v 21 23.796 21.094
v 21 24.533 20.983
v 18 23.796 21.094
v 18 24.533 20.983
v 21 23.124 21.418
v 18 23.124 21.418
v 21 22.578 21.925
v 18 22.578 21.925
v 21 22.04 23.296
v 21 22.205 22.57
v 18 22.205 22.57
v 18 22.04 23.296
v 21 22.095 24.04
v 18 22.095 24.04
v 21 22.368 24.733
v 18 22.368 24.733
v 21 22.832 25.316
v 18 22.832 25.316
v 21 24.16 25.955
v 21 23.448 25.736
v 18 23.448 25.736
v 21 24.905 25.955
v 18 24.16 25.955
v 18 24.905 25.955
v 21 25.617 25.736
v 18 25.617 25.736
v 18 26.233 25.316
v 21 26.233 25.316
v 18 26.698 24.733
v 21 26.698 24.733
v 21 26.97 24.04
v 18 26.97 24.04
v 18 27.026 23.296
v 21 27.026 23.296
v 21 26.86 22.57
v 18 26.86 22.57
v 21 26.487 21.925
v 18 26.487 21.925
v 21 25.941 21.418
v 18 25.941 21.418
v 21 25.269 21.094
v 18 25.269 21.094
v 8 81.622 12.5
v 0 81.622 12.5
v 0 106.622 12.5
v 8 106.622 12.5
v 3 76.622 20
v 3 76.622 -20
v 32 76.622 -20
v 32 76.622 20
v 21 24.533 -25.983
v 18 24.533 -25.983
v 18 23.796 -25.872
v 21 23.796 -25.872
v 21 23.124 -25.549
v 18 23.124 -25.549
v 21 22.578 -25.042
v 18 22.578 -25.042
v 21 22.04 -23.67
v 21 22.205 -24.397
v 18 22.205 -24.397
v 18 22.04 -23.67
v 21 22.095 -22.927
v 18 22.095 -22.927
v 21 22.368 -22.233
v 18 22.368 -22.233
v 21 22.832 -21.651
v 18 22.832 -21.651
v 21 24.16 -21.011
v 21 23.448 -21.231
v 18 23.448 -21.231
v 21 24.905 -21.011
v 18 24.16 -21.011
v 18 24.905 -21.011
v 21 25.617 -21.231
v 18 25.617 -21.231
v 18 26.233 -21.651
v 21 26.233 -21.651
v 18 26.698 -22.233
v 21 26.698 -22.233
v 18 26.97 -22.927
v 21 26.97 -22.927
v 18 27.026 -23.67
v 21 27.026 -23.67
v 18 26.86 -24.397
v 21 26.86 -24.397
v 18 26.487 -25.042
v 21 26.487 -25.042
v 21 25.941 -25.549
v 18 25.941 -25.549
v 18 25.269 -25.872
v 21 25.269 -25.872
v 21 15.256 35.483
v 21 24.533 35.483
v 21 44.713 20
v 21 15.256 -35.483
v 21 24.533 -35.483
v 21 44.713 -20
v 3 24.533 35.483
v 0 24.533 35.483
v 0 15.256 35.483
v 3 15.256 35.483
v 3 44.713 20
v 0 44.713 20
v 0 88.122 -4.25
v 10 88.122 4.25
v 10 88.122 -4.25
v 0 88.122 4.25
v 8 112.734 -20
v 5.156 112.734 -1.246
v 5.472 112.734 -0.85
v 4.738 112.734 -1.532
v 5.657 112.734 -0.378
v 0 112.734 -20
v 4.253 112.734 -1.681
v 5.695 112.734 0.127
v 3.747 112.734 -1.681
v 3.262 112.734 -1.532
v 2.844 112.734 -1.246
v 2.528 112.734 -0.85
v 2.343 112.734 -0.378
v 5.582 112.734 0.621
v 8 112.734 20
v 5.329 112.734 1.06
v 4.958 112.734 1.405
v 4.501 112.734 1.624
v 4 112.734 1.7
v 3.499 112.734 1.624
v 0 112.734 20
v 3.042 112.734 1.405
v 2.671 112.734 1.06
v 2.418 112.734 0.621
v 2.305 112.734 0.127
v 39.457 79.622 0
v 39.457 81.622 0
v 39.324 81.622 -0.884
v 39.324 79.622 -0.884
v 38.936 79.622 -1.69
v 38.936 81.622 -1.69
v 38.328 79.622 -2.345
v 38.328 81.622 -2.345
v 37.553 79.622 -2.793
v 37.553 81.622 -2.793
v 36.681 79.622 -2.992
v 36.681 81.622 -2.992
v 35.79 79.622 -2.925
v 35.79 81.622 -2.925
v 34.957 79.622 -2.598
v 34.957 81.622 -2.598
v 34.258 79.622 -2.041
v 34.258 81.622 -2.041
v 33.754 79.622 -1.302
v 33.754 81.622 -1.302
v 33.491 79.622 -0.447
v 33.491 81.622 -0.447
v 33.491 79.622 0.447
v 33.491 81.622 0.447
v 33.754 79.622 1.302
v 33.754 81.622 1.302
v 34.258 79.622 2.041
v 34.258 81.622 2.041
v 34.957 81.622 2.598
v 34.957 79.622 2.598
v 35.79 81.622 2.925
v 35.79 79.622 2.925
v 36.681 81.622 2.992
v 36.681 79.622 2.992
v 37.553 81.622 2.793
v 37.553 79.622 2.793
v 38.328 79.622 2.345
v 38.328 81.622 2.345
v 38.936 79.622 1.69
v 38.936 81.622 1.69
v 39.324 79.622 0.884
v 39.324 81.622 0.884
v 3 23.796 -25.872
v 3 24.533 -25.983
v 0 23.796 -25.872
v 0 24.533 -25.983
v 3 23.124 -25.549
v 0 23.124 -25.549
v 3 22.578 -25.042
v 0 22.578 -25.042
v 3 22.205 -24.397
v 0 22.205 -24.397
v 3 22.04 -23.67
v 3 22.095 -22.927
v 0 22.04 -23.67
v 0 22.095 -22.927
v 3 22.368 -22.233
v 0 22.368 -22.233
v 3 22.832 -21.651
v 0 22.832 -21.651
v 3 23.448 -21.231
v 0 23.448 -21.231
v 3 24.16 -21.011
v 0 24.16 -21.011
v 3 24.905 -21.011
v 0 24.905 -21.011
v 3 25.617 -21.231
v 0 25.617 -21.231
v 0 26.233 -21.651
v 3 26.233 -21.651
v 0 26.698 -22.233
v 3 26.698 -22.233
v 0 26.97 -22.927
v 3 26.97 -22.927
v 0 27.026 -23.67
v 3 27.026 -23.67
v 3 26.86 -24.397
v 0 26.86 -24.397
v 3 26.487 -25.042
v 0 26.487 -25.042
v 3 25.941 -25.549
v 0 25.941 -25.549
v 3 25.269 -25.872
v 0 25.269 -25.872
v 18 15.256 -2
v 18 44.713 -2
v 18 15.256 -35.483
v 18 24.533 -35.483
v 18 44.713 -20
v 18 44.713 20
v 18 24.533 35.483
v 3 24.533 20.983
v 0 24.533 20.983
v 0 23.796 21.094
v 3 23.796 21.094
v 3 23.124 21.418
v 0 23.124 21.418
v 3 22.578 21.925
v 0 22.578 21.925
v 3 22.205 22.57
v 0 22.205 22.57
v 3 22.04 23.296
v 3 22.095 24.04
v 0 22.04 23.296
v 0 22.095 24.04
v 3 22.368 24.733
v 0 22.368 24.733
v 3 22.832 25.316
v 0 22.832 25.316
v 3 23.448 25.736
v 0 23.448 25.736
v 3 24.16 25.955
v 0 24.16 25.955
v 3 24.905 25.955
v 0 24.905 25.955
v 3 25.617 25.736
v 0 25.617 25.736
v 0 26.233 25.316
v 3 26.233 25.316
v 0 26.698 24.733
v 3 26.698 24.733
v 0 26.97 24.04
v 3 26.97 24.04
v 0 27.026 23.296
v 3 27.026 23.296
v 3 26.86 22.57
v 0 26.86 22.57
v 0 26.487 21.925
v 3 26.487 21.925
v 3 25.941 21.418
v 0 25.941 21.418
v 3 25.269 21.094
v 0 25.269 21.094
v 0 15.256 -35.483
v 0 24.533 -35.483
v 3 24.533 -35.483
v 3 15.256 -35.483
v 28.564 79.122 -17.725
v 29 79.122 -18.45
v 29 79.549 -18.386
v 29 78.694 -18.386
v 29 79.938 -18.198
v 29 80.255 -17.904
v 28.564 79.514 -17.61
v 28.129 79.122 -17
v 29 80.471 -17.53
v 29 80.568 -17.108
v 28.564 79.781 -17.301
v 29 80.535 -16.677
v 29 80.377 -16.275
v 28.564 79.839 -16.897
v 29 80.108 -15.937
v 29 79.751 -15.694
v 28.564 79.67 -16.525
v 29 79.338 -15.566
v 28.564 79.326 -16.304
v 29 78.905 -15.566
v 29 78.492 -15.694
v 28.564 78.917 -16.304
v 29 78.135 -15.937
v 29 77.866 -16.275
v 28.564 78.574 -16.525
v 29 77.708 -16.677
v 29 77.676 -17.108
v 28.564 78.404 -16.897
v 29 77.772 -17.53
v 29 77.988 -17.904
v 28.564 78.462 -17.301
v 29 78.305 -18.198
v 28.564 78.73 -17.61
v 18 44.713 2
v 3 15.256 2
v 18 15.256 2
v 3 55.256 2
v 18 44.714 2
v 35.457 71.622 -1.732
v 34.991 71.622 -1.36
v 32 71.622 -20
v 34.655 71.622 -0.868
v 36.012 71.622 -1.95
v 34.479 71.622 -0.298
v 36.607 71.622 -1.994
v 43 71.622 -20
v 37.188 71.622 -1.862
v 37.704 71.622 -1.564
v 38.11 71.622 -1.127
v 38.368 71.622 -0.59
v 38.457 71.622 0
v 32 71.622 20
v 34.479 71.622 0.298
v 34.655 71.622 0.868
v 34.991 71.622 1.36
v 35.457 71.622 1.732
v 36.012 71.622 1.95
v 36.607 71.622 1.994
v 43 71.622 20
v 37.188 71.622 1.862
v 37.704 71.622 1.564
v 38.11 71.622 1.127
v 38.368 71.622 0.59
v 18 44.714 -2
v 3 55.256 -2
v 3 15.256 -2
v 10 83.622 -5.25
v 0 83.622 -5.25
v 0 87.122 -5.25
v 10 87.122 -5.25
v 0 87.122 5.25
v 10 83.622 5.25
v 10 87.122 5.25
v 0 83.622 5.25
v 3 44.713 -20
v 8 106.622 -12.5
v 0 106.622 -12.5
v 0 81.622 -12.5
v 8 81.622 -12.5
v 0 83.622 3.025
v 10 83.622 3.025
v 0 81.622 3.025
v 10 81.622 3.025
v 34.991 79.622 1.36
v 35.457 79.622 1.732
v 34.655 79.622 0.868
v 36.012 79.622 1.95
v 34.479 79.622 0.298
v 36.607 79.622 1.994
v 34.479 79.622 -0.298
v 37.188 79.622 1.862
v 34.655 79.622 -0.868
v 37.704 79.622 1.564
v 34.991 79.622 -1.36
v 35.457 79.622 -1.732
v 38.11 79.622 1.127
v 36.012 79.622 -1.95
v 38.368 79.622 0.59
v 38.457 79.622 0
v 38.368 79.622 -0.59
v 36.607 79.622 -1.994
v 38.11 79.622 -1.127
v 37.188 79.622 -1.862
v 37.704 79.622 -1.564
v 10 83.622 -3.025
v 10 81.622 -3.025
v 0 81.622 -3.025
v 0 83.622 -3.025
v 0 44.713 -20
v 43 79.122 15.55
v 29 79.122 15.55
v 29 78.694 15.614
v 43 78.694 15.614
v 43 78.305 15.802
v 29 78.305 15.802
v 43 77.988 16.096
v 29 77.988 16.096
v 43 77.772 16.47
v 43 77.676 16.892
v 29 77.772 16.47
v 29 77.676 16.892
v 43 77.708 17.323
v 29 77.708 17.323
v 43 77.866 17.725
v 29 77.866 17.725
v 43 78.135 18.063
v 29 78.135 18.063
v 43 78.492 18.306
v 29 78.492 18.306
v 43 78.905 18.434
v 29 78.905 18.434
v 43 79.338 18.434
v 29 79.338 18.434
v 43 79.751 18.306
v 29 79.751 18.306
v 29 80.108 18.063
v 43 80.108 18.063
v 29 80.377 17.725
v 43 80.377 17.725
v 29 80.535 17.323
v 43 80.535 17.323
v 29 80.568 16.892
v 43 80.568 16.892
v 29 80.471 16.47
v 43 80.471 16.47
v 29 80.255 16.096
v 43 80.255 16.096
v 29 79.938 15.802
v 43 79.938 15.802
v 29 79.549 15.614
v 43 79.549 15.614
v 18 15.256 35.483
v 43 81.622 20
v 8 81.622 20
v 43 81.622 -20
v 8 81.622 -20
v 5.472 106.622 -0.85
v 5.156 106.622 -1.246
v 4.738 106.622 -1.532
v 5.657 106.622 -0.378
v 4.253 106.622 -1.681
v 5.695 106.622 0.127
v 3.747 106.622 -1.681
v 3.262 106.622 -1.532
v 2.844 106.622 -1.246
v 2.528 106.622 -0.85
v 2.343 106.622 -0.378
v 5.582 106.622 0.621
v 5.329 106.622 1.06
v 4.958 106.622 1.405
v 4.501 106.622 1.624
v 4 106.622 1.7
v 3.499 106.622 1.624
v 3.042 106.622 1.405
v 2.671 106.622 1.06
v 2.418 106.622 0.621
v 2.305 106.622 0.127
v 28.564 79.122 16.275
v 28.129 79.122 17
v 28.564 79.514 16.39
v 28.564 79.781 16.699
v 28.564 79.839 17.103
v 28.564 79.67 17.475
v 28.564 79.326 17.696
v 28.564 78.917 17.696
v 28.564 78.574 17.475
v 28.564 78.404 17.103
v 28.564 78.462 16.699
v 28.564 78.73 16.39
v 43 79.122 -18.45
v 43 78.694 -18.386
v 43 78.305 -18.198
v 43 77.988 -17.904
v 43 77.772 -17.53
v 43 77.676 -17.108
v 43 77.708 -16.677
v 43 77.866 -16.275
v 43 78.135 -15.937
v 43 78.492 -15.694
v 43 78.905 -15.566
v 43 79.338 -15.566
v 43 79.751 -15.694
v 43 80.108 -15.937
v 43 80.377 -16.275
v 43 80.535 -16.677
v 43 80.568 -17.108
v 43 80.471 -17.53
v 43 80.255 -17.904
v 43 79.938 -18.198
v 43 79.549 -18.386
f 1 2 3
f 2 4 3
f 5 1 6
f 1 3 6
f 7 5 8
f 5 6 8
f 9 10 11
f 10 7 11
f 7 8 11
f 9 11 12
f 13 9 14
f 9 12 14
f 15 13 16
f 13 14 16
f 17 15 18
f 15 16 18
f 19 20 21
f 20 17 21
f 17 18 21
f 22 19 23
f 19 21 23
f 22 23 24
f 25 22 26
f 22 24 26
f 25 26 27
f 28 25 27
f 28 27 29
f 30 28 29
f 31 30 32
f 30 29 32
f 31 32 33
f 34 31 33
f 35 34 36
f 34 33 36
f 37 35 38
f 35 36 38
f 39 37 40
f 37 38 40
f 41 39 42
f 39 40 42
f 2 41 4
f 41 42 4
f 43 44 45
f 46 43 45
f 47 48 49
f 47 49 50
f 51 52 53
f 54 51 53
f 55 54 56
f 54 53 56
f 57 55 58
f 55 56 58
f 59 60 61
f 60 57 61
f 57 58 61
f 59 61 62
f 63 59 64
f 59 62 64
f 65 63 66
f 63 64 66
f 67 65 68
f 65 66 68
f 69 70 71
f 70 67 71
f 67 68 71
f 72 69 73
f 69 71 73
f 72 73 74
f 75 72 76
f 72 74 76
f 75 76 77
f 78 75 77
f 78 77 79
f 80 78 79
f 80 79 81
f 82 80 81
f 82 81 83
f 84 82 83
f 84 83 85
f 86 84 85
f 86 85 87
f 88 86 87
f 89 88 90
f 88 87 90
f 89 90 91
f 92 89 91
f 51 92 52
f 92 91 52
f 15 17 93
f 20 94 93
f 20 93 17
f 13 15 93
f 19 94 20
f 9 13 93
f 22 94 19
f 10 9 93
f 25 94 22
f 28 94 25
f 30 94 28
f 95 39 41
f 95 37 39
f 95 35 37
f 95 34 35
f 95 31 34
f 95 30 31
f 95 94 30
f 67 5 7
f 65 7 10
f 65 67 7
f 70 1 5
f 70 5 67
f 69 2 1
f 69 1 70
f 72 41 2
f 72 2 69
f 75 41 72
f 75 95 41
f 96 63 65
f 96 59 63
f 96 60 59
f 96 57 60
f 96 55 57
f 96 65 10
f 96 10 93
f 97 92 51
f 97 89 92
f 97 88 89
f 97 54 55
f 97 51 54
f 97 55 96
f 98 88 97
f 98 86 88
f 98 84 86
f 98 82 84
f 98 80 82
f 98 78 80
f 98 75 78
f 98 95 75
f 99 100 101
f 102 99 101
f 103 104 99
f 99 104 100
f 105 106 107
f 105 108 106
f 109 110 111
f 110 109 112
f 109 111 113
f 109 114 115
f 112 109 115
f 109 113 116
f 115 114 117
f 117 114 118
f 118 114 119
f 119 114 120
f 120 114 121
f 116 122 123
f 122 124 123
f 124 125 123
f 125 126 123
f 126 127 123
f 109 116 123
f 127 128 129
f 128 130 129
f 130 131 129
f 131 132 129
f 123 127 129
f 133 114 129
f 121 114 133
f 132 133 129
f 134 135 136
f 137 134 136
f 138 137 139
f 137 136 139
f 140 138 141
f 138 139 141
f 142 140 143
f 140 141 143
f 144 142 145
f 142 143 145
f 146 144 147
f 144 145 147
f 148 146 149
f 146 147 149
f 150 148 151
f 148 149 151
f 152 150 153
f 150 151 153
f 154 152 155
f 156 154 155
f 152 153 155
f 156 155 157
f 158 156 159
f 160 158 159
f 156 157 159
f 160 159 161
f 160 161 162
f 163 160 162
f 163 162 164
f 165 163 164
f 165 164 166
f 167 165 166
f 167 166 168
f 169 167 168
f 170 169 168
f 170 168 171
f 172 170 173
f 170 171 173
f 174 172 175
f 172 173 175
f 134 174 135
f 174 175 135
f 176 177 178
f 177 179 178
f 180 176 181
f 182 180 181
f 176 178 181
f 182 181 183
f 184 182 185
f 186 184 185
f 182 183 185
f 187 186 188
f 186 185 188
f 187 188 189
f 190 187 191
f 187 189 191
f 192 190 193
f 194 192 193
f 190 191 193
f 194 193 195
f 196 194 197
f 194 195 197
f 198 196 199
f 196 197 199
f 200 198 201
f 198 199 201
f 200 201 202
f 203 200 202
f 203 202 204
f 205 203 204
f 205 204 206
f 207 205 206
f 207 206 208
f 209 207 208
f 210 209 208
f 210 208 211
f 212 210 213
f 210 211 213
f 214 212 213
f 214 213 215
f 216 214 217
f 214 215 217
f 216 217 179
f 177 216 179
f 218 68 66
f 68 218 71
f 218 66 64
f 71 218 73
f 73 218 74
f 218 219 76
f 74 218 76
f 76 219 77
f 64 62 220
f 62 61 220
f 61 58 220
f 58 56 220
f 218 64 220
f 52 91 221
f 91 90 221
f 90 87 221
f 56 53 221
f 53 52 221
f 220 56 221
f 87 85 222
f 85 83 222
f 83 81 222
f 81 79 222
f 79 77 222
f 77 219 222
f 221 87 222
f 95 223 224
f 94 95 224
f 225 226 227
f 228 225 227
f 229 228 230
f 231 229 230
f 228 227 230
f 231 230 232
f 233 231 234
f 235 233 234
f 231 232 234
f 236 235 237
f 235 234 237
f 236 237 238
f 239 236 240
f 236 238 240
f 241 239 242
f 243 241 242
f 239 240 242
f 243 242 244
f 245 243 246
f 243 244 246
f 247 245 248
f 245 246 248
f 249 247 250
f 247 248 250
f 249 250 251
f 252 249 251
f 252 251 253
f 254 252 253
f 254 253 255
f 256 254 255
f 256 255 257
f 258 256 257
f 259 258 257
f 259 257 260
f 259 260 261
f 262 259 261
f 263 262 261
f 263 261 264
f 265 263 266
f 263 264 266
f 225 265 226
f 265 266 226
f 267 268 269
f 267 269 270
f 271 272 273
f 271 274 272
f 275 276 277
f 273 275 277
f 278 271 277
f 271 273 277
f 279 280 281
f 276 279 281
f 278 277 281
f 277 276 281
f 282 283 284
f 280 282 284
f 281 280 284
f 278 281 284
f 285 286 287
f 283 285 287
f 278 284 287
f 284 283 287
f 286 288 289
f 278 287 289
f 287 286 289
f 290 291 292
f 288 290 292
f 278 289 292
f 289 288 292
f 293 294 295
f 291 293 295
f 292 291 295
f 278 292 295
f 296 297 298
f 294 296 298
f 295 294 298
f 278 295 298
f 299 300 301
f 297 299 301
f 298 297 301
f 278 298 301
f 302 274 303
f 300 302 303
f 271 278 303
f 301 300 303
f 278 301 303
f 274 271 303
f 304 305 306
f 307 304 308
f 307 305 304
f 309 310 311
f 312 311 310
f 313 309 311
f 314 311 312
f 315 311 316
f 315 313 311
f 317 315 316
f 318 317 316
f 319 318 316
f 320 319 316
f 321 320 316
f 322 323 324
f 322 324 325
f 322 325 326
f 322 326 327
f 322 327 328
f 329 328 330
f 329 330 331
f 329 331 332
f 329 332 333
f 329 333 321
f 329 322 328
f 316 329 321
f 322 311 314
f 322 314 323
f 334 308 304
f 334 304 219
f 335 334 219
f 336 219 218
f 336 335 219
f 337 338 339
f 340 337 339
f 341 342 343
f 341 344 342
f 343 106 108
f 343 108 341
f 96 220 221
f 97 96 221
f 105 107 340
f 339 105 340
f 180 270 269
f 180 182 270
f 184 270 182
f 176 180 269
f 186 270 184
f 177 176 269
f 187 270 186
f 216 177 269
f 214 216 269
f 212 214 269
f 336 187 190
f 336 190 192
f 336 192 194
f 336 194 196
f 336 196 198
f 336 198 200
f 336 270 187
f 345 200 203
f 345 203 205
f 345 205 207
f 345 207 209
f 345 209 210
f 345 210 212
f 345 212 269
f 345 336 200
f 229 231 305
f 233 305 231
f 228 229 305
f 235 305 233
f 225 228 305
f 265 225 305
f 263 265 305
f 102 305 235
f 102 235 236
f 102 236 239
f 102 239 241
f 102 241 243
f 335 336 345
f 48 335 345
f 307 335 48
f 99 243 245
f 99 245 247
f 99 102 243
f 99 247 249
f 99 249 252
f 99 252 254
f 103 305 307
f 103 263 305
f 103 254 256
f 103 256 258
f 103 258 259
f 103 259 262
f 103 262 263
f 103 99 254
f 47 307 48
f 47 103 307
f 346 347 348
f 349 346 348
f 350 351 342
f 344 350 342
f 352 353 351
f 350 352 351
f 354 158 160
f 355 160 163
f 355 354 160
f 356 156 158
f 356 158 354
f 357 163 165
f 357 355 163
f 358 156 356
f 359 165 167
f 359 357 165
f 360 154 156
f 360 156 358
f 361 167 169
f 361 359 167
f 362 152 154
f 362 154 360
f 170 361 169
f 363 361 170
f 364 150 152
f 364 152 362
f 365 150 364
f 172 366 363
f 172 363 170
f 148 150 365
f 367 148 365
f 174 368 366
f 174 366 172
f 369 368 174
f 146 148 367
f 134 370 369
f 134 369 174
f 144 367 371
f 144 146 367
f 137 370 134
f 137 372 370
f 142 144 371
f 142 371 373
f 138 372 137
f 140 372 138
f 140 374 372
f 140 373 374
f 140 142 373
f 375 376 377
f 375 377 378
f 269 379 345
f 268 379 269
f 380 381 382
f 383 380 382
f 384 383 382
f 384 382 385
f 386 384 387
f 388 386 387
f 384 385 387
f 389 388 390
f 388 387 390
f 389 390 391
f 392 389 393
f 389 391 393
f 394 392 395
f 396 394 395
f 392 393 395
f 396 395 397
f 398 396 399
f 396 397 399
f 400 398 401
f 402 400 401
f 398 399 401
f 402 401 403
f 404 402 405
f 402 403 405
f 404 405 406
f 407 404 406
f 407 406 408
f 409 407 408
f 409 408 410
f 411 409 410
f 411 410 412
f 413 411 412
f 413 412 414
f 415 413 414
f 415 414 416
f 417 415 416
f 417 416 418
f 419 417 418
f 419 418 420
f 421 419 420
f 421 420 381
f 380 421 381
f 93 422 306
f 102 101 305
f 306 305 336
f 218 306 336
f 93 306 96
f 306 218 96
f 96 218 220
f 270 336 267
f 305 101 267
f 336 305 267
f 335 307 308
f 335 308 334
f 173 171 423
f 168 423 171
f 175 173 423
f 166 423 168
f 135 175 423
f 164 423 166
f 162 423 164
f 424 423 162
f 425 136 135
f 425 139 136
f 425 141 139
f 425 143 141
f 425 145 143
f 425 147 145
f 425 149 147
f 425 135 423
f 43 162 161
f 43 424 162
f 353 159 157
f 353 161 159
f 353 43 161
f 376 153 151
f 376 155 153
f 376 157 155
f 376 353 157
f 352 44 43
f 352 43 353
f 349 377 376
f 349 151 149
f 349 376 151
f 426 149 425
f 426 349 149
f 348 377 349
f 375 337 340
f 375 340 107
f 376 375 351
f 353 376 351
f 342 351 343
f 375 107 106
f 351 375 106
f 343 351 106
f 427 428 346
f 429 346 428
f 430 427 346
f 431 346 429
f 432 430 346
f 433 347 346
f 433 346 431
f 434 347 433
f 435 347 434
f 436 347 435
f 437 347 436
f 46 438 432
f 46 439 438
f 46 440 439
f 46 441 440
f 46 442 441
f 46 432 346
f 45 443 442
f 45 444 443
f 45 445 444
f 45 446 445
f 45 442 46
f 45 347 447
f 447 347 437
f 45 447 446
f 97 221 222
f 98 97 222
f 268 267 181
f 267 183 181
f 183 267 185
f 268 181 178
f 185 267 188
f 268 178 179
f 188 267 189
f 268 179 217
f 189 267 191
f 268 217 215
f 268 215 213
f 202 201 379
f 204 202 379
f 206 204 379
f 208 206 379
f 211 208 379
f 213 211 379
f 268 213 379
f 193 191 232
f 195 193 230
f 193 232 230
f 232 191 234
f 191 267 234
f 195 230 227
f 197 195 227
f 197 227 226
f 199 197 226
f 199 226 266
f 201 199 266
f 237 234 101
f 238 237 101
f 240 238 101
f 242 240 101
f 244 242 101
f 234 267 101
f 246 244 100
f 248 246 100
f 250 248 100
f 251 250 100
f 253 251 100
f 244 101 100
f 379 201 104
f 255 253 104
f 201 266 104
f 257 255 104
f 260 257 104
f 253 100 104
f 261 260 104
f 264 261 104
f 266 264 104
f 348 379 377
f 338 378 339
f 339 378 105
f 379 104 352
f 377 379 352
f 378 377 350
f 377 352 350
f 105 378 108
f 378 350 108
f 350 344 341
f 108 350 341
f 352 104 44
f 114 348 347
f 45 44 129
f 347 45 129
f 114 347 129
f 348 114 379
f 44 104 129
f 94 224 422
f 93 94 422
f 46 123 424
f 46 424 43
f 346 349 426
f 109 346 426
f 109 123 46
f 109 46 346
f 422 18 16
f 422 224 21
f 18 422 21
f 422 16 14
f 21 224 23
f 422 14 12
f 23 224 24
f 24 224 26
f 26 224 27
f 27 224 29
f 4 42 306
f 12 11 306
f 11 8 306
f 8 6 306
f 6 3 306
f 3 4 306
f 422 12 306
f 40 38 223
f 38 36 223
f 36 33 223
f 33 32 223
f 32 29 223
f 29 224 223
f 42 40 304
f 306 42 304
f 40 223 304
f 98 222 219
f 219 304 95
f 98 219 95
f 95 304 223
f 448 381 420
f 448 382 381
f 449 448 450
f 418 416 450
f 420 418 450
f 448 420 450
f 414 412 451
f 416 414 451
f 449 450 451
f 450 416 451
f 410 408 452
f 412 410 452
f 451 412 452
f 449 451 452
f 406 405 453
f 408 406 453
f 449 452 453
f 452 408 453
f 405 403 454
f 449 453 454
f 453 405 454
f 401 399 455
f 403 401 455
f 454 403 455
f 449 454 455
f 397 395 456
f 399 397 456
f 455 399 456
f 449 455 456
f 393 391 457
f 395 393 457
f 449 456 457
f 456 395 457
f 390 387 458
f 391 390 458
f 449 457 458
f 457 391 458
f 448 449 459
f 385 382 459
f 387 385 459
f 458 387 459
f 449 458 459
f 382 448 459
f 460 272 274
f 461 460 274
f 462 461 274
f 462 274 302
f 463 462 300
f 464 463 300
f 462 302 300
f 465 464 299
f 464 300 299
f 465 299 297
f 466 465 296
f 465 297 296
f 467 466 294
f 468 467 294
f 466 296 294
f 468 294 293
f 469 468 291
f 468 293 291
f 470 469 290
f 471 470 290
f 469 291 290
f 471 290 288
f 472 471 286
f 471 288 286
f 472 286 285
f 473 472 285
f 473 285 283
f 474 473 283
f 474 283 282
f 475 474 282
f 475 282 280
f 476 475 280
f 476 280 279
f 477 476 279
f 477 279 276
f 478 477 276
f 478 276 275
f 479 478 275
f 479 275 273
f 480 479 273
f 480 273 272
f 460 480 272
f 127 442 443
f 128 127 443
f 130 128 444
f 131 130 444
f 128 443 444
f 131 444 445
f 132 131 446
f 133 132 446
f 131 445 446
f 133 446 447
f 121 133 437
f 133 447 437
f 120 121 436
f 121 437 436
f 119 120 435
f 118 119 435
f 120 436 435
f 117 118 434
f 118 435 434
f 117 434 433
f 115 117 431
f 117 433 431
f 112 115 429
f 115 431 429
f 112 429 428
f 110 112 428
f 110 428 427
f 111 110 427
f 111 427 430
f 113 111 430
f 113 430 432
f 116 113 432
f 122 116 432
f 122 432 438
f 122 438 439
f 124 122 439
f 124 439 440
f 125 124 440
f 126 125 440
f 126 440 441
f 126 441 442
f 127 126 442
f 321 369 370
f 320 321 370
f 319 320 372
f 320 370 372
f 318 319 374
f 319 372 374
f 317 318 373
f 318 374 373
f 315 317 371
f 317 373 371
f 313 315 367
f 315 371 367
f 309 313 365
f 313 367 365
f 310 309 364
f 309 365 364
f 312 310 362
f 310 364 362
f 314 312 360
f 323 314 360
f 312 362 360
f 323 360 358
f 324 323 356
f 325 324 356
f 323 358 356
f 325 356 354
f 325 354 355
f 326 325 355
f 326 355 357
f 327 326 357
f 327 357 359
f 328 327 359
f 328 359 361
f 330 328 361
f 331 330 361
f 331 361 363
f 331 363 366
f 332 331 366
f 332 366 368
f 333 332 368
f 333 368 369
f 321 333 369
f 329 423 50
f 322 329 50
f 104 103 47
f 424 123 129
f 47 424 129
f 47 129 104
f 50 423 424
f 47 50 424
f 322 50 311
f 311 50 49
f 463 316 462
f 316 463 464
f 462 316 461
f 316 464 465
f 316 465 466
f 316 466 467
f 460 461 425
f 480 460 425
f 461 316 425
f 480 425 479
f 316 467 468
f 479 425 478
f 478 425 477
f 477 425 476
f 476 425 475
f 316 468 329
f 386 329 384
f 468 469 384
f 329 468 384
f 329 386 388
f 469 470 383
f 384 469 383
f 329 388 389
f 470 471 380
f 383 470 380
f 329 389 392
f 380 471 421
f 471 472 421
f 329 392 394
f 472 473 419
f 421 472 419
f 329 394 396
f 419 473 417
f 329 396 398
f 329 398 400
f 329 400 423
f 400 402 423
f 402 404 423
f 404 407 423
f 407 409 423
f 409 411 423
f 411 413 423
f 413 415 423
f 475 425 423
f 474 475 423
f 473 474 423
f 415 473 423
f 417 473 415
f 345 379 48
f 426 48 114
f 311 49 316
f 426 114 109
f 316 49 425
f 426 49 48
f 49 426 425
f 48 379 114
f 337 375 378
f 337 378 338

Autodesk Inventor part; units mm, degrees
ref_plane "YZ Plane" through (0, 0, 0) normal (1, 0, 0) x (0, 1, 0)
ref_plane "XZ Plane" through (0, 0, 0) normal (0, 1, 0) x (-1, 0, 0)
ref_plane "XY Plane" through (0, 0, 0) normal (0, 0, 1) x (1, 0, 0)
sketch "Szkic1" plane through (0, 0, 0) normal (1, 0, 0) x (0, 1, 0)
  line L0 (81.6216, 12.5) -> (106.6216, 12.5)
  line L1 (106.6216, 12.5) -> (106.6216, -12.5)
  line L2 (106.6216, -12.5) -> (81.6216, -12.5)
  line L3 (81.6216, -12.5) -> (81.6216, 12.5)
  line L4 (81.6216, 12.5) -> (106.6216, -12.5) construction
  line L5 (106.6216, 12.5) -> (81.6216, -12.5) construction
  line L6 (112.7335, 0) -> (112.7335, 20)
  line L7 (112.7335, 20) -> (44.7131, 20)
  line L8 (44.7131, 20) -> (24.5326, 35.4833)
  line L9 (24.5326, 35.4833) -> (15.2555, 35.4833)
  line L10 (15.2555, 35.4833) -> (15.2555, 0)
  line L11 (112.7335, 0) -> (112.7335, -20)
  line L12 (112.7335, -20) -> (44.7131, -20)
  line L13 (44.7131, -20) -> (24.5326, -35.4833)
  line L14 (24.5326, -35.4833) -> (15.2555, -35.4833)
  line L15 (15.2555, -35.4833) -> (15.2555, 0)
  point P0 (0, 0)
  point P1 (94.1216, 0)
  point P2 (24.5326, 19.6832)
  point P3 (24.5326, -19.6832)
  dimension "d0" = 25
  dimension "d1" = 25
  dimension "d2" = 82.089
  dimension "d3" = 20
extrude "Wyciągnięcie proste1" add sketch "Szkic1" along normal blind 3
sketch "Szkic2" plane through (3, 0, 0) normal (1, 0, 0) x (0, 0, -1)
  line L0 (-12.5, 106.6216) -> (12.5, 106.6216) projected
  line L1 (-35.4833, 24.5326) -> (-35.4833, 15.2555) projected
  line L2 (35.4833, 15.2555) -> (35.4833, 24.5326) projected
  point P0 (0, 0)
  point P1 (-23.4833, 24.5326)
  point P2 (23.4833, 24.5326)
  dimension "d6" = 82.089
  dimension "d7" = 82.089
  dimension "d8" = 12
  dimension "d9" = 12
hole "Otwór1" at (3, 24.5326, 23.4833) at (3, 24.5326, -23.4833) direction (-1, 0, 0) diameter 5 depth 3 clearance for "Śruba ze łbem płaskim obrobiona" size "M4" standard "ANSI Profil metryczny M"
sketch "Szkic3" plane through (3, 0, 0) normal (1, 0, 0) x (0, 0, -1)
  line L0 (-12.5, 106.6216) -> (12.5, 106.6216) projected
  line L1 (-12.5, 106.6216) -> (-20, 106.6216)
  line L2 (-20, 112.7335) -> (-20, 44.7131) projected
  line L3 (-12.5, 81.6216) -> (-12.5, 106.6216) projected
  line L4 (-20, 81.6216) -> (-12.5, 81.6216)
  line L5 (-12.5, 81.6216) -> (-12.5, 106.6216)
  line L6 (12.5, 106.6216) -> (12.5, 81.6216) projected
  line L7 (12.5, 106.6216) -> (12.5, 81.6216)
  line L8 (12.5, 81.6216) -> (20, 81.6216)
  line L9 (20, 81.6216) -> (20, 106.6216)
  line L10 (20, 106.6216) -> (12.5, 106.6216)
  line L11 (20, 44.7131) -> (20, 112.7335) projected
  point P0 (0, 0)
  point P1 (-20, 81.6216)
  dimension "d36" = 0
extrude "Wyciągnięcie proste2" add sketch "Szkic3" along normal blind 5
sketch "Szkic5" plane through (3, 0, 0) normal (1, 0, 0) x (0, 0, -1)
  line L0 (-35.4833, 15.2555) -> (35.4833, 15.2555) projected
  line L1 (0, 15.2555) -> (-2, 15.2555)
  line L2 (-2, 15.2555) -> (-2, 55.2555)
  line L3 (-2, 55.2555) -> (2, 55.2555)
  line L4 (2, 55.2555) -> (2, 15.2555)
  line L5 (0, 15.2555) -> (2, 15.2555)
  point P0 (0, 0)
  dimension "d26" = 2
  dimension "d27" = 40
  dimension "d28" = 4
extrude "Wyciągnięcie proste3" add sketch "Szkic5" along normal blind 15
sketch "Szkic6" plane through (18, 0, 0) normal (1, 0, 0) x (0, 0, -1)
  line L0 (-35.4833, 15.2555) -> (35.4833, 15.2555) projected
  line L1 (35.4833, 15.2555) -> (35.4833, 24.5326) projected
  line L2 (-35.4833, 15.2555) -> (35.4833, 15.2555)
  line L3 (35.4833, 15.2555) -> (35.4833, 24.5326)
  line L4 (35.4833, 24.5326) -> (20, 44.7131) projected
  line L5 (35.4833, 24.5326) -> (20, 44.7131)
  line L6 (-20, 44.7131) -> (-35.4833, 24.5326) projected
  line L7 (20, 44.7131) -> (-20, 44.7131)
  line L8 (-35.4833, 24.5326) -> (-35.4833, 15.2555) projected
  line L9 (-20, 44.7131) -> (-35.4833, 24.5326)
  line L10 (-35.4833, 24.5326) -> (-35.4833, 15.2555)
  circle A0 centre (-23.4833, 24.5326) radius 2.5 projected
  circle A1 centre (23.4833, 24.5326) radius 2.5 projected
  point P0 (0, 0)
extrude "Wyciągnięcie proste4" add sketch "Szkic6" along normal blind 3
chamfer "Faza1" distance 10.542 distance2 15 1 edges at (18, 55.2555, 0) measured on face at (18, 51.7413, 0.6667)
sketch "Szkic7" plane through (3, 0, 0) normal (1, 0, 0) x (0, 0, -1)
  line L0 (-20, 81.6216) -> (-12.5, 81.6216) projected
  line L1 (20, 44.7131) -> (20, 112.7335) projected
  line L2 (-20, 81.6216) -> (20, 81.6216)
  line L3 (20, 81.6216) -> (20, 76.6216)
  line L4 (20, 76.6216) -> (-20, 76.6216)
  line L5 (-20, 76.6216) -> (-20, 81.6216)
  point P0 (0, 0)
  dimension "d37" = 5
extrude "Wyciągnięcie proste5" add sketch "Szkic7" along normal blind 40
sketch "Szkic8" plane through (0, 81.6216, 12.5) normal (0, 1, 0) x (1, 0, 0)
  point P0 (0, 12.5)
  point P1 (36.4571, 12.5)
hole "Otwór3" at (36.4571, 81.6216, 0) direction (0, -1, 0) diameter 4 end through all clearance for "Śruba ze łbem płaskim obrobiona" size "M4" standard "ANSI Profil metryczny M"
sketch "Szkic9" plane through (3, 0, 0) normal (1, 0, 0) x (0, 0, -1)
  line L0 (20, 112.7335) -> (-20, 112.7335) projected
  line L1 (20, 106.6216) -> (12.5, 106.6216) projected
  line L2 (-20, 112.7335) -> (20, 112.7335)
  line L3 (20, 112.7335) -> (20, 106.6216)
  line L4 (20, 106.6216) -> (-20, 106.6216)
  line L5 (-20, 106.6216) -> (-20, 112.7335)
  point P0 (0, 0)
extrude "Wyciągnięcie proste6" add sketch "Szkic9" along normal up to surface (5 mm away)
sketch "Szkic10" plane through (0, 0, 0) normal (-1, 0, 0) x (0, 0, 1)
  line L0 (-3.025, 81.6216) -> (-3.025, 83.6216)
  line L1 (-3.025, 83.6216) -> (-5.25, 83.6216)
  line L2 (-5.25, 83.6216) -> (-5.25, 87.1216)
  line L3 (0, 88.1216) -> (-4.25, 88.1216)
  line L4 (-4.25, 88.1216) -> (-5.25, 87.1216)
  line L5 (0, 88.1216) -> (4.25, 88.1216)
  line L6 (4.25, 88.1216) -> (5.25, 87.1216)
  line L7 (5.25, 83.6216) -> (5.25, 87.1216)
  line L8 (3.025, 83.6216) -> (5.25, 83.6216)
  line L9 (3.025, 81.6216) -> (3.025, 83.6216)
  line L10 (-12.5, 81.6216) -> (12.5, 81.6216) projected
  point P0 (0, 0)
  point P1 (0, 81.6216)
  point P2 (0, 81.6216)
  point P3 (-3.025, 82.6216)
  dimension "d49" = 2
  dimension "d50" = 2.225
  dimension "d51" = 3.5
  dimension "d52" = 4.25
  dimension "d53" = 0
  dimension "d54" = 3.025
extrude "Wyciągnięcie proste7" add sketch "Szkic10" against normal blind 10
sketch "Szkic11" plane through (0, 112.7335, 20) normal (0, 1, 0) x (1, 0, 0)
  point P0 (0, 20)
  point P1 (4, 20)
hole "Otwór4" at (4, 112.7335, 0) direction (0, -1, 0) diameter 3.4 depth 6.1119 clearance for "Śruba ze łbem płaskim obrobiona" size "M3" standard "ANSI Profil metryczny M"
sketch "Szkic13" plane through (3, 76.6216, -20) normal (0, -1, 0) x (1, 0, 0)
  line L0 (0, 0) -> (40, 0) projected
  line L1 (40, 40) -> (29, 40)
  line L2 (29, 40) -> (29, 0)
  line L3 (29, 0) -> (40, 0)
  line L4 (40, 0) -> (40, 40)
  point P0 (-3, 20)
  dimension "d65" = 11
extrude "Wyciągnięcie proste8" add sketch "Szkic13" along normal blind 5
sketch "Szkic14" plane through (0, 81.6216, 12.5) normal (0, 1, 0) x (1, 0, 0)
  circle A0 centre (36.4571, 12.5) radius 2 projected
  circle A1 centre (36.4571, 12.5) radius 2
  point P0 (0, 12.5)
extrude "Wyciągnięcie proste9" cut sketch "Szkic14" against normal blind 10
sketch "Szkic15" plane through (0, 81.6216, 12.5) normal (0, 1, 0) x (1, 0, 0)
  circle A0 centre (36.4571, 12.5) radius 2 projected
  circle A1 centre (36.4571, 12.5) radius 3
  point P0 (0, 12.5)
  dimension "d70" = 6
extrude "Wyciągnięcie proste10" cut sketch "Szkic15" against normal blind 2
sketch "Szkic16" plane through (43, 0, 0) normal (1, 0, 0) x (0, 0, -1)
  line L0 (20, 81.6216) -> (-20, 81.6216) projected
  line L1 (-20, 81.6216) -> (-20, 71.6216) projected
  line L2 (20, 81.6216) -> (20, 71.6216) projected
  point P0 (0, 0)
  point P1 (-17, 79.1216)
  point P2 (17, 79.1216)
  dimension "d73" = 2.5
  dimension "d74" = 3
  dimension "d75" = 2.5
  dimension "d76" = 3
hole "Otwór5" at (43, 79.1216, 17) at (43, 79.1216, -17) direction (-1, 0, 0) diameter 2.9 depth 14 tip angle 118 clearance for "Śruba ze łbem płaskim obrobiona" size "M2.5" standard "ANSI Profil metryczny M"
equation "\"d7\" = d6"
equation "\"d9\" = d8"
equation "\"d75\" = d73"
equation "\"d76\" = d74"
properties part number "równoważnia"
